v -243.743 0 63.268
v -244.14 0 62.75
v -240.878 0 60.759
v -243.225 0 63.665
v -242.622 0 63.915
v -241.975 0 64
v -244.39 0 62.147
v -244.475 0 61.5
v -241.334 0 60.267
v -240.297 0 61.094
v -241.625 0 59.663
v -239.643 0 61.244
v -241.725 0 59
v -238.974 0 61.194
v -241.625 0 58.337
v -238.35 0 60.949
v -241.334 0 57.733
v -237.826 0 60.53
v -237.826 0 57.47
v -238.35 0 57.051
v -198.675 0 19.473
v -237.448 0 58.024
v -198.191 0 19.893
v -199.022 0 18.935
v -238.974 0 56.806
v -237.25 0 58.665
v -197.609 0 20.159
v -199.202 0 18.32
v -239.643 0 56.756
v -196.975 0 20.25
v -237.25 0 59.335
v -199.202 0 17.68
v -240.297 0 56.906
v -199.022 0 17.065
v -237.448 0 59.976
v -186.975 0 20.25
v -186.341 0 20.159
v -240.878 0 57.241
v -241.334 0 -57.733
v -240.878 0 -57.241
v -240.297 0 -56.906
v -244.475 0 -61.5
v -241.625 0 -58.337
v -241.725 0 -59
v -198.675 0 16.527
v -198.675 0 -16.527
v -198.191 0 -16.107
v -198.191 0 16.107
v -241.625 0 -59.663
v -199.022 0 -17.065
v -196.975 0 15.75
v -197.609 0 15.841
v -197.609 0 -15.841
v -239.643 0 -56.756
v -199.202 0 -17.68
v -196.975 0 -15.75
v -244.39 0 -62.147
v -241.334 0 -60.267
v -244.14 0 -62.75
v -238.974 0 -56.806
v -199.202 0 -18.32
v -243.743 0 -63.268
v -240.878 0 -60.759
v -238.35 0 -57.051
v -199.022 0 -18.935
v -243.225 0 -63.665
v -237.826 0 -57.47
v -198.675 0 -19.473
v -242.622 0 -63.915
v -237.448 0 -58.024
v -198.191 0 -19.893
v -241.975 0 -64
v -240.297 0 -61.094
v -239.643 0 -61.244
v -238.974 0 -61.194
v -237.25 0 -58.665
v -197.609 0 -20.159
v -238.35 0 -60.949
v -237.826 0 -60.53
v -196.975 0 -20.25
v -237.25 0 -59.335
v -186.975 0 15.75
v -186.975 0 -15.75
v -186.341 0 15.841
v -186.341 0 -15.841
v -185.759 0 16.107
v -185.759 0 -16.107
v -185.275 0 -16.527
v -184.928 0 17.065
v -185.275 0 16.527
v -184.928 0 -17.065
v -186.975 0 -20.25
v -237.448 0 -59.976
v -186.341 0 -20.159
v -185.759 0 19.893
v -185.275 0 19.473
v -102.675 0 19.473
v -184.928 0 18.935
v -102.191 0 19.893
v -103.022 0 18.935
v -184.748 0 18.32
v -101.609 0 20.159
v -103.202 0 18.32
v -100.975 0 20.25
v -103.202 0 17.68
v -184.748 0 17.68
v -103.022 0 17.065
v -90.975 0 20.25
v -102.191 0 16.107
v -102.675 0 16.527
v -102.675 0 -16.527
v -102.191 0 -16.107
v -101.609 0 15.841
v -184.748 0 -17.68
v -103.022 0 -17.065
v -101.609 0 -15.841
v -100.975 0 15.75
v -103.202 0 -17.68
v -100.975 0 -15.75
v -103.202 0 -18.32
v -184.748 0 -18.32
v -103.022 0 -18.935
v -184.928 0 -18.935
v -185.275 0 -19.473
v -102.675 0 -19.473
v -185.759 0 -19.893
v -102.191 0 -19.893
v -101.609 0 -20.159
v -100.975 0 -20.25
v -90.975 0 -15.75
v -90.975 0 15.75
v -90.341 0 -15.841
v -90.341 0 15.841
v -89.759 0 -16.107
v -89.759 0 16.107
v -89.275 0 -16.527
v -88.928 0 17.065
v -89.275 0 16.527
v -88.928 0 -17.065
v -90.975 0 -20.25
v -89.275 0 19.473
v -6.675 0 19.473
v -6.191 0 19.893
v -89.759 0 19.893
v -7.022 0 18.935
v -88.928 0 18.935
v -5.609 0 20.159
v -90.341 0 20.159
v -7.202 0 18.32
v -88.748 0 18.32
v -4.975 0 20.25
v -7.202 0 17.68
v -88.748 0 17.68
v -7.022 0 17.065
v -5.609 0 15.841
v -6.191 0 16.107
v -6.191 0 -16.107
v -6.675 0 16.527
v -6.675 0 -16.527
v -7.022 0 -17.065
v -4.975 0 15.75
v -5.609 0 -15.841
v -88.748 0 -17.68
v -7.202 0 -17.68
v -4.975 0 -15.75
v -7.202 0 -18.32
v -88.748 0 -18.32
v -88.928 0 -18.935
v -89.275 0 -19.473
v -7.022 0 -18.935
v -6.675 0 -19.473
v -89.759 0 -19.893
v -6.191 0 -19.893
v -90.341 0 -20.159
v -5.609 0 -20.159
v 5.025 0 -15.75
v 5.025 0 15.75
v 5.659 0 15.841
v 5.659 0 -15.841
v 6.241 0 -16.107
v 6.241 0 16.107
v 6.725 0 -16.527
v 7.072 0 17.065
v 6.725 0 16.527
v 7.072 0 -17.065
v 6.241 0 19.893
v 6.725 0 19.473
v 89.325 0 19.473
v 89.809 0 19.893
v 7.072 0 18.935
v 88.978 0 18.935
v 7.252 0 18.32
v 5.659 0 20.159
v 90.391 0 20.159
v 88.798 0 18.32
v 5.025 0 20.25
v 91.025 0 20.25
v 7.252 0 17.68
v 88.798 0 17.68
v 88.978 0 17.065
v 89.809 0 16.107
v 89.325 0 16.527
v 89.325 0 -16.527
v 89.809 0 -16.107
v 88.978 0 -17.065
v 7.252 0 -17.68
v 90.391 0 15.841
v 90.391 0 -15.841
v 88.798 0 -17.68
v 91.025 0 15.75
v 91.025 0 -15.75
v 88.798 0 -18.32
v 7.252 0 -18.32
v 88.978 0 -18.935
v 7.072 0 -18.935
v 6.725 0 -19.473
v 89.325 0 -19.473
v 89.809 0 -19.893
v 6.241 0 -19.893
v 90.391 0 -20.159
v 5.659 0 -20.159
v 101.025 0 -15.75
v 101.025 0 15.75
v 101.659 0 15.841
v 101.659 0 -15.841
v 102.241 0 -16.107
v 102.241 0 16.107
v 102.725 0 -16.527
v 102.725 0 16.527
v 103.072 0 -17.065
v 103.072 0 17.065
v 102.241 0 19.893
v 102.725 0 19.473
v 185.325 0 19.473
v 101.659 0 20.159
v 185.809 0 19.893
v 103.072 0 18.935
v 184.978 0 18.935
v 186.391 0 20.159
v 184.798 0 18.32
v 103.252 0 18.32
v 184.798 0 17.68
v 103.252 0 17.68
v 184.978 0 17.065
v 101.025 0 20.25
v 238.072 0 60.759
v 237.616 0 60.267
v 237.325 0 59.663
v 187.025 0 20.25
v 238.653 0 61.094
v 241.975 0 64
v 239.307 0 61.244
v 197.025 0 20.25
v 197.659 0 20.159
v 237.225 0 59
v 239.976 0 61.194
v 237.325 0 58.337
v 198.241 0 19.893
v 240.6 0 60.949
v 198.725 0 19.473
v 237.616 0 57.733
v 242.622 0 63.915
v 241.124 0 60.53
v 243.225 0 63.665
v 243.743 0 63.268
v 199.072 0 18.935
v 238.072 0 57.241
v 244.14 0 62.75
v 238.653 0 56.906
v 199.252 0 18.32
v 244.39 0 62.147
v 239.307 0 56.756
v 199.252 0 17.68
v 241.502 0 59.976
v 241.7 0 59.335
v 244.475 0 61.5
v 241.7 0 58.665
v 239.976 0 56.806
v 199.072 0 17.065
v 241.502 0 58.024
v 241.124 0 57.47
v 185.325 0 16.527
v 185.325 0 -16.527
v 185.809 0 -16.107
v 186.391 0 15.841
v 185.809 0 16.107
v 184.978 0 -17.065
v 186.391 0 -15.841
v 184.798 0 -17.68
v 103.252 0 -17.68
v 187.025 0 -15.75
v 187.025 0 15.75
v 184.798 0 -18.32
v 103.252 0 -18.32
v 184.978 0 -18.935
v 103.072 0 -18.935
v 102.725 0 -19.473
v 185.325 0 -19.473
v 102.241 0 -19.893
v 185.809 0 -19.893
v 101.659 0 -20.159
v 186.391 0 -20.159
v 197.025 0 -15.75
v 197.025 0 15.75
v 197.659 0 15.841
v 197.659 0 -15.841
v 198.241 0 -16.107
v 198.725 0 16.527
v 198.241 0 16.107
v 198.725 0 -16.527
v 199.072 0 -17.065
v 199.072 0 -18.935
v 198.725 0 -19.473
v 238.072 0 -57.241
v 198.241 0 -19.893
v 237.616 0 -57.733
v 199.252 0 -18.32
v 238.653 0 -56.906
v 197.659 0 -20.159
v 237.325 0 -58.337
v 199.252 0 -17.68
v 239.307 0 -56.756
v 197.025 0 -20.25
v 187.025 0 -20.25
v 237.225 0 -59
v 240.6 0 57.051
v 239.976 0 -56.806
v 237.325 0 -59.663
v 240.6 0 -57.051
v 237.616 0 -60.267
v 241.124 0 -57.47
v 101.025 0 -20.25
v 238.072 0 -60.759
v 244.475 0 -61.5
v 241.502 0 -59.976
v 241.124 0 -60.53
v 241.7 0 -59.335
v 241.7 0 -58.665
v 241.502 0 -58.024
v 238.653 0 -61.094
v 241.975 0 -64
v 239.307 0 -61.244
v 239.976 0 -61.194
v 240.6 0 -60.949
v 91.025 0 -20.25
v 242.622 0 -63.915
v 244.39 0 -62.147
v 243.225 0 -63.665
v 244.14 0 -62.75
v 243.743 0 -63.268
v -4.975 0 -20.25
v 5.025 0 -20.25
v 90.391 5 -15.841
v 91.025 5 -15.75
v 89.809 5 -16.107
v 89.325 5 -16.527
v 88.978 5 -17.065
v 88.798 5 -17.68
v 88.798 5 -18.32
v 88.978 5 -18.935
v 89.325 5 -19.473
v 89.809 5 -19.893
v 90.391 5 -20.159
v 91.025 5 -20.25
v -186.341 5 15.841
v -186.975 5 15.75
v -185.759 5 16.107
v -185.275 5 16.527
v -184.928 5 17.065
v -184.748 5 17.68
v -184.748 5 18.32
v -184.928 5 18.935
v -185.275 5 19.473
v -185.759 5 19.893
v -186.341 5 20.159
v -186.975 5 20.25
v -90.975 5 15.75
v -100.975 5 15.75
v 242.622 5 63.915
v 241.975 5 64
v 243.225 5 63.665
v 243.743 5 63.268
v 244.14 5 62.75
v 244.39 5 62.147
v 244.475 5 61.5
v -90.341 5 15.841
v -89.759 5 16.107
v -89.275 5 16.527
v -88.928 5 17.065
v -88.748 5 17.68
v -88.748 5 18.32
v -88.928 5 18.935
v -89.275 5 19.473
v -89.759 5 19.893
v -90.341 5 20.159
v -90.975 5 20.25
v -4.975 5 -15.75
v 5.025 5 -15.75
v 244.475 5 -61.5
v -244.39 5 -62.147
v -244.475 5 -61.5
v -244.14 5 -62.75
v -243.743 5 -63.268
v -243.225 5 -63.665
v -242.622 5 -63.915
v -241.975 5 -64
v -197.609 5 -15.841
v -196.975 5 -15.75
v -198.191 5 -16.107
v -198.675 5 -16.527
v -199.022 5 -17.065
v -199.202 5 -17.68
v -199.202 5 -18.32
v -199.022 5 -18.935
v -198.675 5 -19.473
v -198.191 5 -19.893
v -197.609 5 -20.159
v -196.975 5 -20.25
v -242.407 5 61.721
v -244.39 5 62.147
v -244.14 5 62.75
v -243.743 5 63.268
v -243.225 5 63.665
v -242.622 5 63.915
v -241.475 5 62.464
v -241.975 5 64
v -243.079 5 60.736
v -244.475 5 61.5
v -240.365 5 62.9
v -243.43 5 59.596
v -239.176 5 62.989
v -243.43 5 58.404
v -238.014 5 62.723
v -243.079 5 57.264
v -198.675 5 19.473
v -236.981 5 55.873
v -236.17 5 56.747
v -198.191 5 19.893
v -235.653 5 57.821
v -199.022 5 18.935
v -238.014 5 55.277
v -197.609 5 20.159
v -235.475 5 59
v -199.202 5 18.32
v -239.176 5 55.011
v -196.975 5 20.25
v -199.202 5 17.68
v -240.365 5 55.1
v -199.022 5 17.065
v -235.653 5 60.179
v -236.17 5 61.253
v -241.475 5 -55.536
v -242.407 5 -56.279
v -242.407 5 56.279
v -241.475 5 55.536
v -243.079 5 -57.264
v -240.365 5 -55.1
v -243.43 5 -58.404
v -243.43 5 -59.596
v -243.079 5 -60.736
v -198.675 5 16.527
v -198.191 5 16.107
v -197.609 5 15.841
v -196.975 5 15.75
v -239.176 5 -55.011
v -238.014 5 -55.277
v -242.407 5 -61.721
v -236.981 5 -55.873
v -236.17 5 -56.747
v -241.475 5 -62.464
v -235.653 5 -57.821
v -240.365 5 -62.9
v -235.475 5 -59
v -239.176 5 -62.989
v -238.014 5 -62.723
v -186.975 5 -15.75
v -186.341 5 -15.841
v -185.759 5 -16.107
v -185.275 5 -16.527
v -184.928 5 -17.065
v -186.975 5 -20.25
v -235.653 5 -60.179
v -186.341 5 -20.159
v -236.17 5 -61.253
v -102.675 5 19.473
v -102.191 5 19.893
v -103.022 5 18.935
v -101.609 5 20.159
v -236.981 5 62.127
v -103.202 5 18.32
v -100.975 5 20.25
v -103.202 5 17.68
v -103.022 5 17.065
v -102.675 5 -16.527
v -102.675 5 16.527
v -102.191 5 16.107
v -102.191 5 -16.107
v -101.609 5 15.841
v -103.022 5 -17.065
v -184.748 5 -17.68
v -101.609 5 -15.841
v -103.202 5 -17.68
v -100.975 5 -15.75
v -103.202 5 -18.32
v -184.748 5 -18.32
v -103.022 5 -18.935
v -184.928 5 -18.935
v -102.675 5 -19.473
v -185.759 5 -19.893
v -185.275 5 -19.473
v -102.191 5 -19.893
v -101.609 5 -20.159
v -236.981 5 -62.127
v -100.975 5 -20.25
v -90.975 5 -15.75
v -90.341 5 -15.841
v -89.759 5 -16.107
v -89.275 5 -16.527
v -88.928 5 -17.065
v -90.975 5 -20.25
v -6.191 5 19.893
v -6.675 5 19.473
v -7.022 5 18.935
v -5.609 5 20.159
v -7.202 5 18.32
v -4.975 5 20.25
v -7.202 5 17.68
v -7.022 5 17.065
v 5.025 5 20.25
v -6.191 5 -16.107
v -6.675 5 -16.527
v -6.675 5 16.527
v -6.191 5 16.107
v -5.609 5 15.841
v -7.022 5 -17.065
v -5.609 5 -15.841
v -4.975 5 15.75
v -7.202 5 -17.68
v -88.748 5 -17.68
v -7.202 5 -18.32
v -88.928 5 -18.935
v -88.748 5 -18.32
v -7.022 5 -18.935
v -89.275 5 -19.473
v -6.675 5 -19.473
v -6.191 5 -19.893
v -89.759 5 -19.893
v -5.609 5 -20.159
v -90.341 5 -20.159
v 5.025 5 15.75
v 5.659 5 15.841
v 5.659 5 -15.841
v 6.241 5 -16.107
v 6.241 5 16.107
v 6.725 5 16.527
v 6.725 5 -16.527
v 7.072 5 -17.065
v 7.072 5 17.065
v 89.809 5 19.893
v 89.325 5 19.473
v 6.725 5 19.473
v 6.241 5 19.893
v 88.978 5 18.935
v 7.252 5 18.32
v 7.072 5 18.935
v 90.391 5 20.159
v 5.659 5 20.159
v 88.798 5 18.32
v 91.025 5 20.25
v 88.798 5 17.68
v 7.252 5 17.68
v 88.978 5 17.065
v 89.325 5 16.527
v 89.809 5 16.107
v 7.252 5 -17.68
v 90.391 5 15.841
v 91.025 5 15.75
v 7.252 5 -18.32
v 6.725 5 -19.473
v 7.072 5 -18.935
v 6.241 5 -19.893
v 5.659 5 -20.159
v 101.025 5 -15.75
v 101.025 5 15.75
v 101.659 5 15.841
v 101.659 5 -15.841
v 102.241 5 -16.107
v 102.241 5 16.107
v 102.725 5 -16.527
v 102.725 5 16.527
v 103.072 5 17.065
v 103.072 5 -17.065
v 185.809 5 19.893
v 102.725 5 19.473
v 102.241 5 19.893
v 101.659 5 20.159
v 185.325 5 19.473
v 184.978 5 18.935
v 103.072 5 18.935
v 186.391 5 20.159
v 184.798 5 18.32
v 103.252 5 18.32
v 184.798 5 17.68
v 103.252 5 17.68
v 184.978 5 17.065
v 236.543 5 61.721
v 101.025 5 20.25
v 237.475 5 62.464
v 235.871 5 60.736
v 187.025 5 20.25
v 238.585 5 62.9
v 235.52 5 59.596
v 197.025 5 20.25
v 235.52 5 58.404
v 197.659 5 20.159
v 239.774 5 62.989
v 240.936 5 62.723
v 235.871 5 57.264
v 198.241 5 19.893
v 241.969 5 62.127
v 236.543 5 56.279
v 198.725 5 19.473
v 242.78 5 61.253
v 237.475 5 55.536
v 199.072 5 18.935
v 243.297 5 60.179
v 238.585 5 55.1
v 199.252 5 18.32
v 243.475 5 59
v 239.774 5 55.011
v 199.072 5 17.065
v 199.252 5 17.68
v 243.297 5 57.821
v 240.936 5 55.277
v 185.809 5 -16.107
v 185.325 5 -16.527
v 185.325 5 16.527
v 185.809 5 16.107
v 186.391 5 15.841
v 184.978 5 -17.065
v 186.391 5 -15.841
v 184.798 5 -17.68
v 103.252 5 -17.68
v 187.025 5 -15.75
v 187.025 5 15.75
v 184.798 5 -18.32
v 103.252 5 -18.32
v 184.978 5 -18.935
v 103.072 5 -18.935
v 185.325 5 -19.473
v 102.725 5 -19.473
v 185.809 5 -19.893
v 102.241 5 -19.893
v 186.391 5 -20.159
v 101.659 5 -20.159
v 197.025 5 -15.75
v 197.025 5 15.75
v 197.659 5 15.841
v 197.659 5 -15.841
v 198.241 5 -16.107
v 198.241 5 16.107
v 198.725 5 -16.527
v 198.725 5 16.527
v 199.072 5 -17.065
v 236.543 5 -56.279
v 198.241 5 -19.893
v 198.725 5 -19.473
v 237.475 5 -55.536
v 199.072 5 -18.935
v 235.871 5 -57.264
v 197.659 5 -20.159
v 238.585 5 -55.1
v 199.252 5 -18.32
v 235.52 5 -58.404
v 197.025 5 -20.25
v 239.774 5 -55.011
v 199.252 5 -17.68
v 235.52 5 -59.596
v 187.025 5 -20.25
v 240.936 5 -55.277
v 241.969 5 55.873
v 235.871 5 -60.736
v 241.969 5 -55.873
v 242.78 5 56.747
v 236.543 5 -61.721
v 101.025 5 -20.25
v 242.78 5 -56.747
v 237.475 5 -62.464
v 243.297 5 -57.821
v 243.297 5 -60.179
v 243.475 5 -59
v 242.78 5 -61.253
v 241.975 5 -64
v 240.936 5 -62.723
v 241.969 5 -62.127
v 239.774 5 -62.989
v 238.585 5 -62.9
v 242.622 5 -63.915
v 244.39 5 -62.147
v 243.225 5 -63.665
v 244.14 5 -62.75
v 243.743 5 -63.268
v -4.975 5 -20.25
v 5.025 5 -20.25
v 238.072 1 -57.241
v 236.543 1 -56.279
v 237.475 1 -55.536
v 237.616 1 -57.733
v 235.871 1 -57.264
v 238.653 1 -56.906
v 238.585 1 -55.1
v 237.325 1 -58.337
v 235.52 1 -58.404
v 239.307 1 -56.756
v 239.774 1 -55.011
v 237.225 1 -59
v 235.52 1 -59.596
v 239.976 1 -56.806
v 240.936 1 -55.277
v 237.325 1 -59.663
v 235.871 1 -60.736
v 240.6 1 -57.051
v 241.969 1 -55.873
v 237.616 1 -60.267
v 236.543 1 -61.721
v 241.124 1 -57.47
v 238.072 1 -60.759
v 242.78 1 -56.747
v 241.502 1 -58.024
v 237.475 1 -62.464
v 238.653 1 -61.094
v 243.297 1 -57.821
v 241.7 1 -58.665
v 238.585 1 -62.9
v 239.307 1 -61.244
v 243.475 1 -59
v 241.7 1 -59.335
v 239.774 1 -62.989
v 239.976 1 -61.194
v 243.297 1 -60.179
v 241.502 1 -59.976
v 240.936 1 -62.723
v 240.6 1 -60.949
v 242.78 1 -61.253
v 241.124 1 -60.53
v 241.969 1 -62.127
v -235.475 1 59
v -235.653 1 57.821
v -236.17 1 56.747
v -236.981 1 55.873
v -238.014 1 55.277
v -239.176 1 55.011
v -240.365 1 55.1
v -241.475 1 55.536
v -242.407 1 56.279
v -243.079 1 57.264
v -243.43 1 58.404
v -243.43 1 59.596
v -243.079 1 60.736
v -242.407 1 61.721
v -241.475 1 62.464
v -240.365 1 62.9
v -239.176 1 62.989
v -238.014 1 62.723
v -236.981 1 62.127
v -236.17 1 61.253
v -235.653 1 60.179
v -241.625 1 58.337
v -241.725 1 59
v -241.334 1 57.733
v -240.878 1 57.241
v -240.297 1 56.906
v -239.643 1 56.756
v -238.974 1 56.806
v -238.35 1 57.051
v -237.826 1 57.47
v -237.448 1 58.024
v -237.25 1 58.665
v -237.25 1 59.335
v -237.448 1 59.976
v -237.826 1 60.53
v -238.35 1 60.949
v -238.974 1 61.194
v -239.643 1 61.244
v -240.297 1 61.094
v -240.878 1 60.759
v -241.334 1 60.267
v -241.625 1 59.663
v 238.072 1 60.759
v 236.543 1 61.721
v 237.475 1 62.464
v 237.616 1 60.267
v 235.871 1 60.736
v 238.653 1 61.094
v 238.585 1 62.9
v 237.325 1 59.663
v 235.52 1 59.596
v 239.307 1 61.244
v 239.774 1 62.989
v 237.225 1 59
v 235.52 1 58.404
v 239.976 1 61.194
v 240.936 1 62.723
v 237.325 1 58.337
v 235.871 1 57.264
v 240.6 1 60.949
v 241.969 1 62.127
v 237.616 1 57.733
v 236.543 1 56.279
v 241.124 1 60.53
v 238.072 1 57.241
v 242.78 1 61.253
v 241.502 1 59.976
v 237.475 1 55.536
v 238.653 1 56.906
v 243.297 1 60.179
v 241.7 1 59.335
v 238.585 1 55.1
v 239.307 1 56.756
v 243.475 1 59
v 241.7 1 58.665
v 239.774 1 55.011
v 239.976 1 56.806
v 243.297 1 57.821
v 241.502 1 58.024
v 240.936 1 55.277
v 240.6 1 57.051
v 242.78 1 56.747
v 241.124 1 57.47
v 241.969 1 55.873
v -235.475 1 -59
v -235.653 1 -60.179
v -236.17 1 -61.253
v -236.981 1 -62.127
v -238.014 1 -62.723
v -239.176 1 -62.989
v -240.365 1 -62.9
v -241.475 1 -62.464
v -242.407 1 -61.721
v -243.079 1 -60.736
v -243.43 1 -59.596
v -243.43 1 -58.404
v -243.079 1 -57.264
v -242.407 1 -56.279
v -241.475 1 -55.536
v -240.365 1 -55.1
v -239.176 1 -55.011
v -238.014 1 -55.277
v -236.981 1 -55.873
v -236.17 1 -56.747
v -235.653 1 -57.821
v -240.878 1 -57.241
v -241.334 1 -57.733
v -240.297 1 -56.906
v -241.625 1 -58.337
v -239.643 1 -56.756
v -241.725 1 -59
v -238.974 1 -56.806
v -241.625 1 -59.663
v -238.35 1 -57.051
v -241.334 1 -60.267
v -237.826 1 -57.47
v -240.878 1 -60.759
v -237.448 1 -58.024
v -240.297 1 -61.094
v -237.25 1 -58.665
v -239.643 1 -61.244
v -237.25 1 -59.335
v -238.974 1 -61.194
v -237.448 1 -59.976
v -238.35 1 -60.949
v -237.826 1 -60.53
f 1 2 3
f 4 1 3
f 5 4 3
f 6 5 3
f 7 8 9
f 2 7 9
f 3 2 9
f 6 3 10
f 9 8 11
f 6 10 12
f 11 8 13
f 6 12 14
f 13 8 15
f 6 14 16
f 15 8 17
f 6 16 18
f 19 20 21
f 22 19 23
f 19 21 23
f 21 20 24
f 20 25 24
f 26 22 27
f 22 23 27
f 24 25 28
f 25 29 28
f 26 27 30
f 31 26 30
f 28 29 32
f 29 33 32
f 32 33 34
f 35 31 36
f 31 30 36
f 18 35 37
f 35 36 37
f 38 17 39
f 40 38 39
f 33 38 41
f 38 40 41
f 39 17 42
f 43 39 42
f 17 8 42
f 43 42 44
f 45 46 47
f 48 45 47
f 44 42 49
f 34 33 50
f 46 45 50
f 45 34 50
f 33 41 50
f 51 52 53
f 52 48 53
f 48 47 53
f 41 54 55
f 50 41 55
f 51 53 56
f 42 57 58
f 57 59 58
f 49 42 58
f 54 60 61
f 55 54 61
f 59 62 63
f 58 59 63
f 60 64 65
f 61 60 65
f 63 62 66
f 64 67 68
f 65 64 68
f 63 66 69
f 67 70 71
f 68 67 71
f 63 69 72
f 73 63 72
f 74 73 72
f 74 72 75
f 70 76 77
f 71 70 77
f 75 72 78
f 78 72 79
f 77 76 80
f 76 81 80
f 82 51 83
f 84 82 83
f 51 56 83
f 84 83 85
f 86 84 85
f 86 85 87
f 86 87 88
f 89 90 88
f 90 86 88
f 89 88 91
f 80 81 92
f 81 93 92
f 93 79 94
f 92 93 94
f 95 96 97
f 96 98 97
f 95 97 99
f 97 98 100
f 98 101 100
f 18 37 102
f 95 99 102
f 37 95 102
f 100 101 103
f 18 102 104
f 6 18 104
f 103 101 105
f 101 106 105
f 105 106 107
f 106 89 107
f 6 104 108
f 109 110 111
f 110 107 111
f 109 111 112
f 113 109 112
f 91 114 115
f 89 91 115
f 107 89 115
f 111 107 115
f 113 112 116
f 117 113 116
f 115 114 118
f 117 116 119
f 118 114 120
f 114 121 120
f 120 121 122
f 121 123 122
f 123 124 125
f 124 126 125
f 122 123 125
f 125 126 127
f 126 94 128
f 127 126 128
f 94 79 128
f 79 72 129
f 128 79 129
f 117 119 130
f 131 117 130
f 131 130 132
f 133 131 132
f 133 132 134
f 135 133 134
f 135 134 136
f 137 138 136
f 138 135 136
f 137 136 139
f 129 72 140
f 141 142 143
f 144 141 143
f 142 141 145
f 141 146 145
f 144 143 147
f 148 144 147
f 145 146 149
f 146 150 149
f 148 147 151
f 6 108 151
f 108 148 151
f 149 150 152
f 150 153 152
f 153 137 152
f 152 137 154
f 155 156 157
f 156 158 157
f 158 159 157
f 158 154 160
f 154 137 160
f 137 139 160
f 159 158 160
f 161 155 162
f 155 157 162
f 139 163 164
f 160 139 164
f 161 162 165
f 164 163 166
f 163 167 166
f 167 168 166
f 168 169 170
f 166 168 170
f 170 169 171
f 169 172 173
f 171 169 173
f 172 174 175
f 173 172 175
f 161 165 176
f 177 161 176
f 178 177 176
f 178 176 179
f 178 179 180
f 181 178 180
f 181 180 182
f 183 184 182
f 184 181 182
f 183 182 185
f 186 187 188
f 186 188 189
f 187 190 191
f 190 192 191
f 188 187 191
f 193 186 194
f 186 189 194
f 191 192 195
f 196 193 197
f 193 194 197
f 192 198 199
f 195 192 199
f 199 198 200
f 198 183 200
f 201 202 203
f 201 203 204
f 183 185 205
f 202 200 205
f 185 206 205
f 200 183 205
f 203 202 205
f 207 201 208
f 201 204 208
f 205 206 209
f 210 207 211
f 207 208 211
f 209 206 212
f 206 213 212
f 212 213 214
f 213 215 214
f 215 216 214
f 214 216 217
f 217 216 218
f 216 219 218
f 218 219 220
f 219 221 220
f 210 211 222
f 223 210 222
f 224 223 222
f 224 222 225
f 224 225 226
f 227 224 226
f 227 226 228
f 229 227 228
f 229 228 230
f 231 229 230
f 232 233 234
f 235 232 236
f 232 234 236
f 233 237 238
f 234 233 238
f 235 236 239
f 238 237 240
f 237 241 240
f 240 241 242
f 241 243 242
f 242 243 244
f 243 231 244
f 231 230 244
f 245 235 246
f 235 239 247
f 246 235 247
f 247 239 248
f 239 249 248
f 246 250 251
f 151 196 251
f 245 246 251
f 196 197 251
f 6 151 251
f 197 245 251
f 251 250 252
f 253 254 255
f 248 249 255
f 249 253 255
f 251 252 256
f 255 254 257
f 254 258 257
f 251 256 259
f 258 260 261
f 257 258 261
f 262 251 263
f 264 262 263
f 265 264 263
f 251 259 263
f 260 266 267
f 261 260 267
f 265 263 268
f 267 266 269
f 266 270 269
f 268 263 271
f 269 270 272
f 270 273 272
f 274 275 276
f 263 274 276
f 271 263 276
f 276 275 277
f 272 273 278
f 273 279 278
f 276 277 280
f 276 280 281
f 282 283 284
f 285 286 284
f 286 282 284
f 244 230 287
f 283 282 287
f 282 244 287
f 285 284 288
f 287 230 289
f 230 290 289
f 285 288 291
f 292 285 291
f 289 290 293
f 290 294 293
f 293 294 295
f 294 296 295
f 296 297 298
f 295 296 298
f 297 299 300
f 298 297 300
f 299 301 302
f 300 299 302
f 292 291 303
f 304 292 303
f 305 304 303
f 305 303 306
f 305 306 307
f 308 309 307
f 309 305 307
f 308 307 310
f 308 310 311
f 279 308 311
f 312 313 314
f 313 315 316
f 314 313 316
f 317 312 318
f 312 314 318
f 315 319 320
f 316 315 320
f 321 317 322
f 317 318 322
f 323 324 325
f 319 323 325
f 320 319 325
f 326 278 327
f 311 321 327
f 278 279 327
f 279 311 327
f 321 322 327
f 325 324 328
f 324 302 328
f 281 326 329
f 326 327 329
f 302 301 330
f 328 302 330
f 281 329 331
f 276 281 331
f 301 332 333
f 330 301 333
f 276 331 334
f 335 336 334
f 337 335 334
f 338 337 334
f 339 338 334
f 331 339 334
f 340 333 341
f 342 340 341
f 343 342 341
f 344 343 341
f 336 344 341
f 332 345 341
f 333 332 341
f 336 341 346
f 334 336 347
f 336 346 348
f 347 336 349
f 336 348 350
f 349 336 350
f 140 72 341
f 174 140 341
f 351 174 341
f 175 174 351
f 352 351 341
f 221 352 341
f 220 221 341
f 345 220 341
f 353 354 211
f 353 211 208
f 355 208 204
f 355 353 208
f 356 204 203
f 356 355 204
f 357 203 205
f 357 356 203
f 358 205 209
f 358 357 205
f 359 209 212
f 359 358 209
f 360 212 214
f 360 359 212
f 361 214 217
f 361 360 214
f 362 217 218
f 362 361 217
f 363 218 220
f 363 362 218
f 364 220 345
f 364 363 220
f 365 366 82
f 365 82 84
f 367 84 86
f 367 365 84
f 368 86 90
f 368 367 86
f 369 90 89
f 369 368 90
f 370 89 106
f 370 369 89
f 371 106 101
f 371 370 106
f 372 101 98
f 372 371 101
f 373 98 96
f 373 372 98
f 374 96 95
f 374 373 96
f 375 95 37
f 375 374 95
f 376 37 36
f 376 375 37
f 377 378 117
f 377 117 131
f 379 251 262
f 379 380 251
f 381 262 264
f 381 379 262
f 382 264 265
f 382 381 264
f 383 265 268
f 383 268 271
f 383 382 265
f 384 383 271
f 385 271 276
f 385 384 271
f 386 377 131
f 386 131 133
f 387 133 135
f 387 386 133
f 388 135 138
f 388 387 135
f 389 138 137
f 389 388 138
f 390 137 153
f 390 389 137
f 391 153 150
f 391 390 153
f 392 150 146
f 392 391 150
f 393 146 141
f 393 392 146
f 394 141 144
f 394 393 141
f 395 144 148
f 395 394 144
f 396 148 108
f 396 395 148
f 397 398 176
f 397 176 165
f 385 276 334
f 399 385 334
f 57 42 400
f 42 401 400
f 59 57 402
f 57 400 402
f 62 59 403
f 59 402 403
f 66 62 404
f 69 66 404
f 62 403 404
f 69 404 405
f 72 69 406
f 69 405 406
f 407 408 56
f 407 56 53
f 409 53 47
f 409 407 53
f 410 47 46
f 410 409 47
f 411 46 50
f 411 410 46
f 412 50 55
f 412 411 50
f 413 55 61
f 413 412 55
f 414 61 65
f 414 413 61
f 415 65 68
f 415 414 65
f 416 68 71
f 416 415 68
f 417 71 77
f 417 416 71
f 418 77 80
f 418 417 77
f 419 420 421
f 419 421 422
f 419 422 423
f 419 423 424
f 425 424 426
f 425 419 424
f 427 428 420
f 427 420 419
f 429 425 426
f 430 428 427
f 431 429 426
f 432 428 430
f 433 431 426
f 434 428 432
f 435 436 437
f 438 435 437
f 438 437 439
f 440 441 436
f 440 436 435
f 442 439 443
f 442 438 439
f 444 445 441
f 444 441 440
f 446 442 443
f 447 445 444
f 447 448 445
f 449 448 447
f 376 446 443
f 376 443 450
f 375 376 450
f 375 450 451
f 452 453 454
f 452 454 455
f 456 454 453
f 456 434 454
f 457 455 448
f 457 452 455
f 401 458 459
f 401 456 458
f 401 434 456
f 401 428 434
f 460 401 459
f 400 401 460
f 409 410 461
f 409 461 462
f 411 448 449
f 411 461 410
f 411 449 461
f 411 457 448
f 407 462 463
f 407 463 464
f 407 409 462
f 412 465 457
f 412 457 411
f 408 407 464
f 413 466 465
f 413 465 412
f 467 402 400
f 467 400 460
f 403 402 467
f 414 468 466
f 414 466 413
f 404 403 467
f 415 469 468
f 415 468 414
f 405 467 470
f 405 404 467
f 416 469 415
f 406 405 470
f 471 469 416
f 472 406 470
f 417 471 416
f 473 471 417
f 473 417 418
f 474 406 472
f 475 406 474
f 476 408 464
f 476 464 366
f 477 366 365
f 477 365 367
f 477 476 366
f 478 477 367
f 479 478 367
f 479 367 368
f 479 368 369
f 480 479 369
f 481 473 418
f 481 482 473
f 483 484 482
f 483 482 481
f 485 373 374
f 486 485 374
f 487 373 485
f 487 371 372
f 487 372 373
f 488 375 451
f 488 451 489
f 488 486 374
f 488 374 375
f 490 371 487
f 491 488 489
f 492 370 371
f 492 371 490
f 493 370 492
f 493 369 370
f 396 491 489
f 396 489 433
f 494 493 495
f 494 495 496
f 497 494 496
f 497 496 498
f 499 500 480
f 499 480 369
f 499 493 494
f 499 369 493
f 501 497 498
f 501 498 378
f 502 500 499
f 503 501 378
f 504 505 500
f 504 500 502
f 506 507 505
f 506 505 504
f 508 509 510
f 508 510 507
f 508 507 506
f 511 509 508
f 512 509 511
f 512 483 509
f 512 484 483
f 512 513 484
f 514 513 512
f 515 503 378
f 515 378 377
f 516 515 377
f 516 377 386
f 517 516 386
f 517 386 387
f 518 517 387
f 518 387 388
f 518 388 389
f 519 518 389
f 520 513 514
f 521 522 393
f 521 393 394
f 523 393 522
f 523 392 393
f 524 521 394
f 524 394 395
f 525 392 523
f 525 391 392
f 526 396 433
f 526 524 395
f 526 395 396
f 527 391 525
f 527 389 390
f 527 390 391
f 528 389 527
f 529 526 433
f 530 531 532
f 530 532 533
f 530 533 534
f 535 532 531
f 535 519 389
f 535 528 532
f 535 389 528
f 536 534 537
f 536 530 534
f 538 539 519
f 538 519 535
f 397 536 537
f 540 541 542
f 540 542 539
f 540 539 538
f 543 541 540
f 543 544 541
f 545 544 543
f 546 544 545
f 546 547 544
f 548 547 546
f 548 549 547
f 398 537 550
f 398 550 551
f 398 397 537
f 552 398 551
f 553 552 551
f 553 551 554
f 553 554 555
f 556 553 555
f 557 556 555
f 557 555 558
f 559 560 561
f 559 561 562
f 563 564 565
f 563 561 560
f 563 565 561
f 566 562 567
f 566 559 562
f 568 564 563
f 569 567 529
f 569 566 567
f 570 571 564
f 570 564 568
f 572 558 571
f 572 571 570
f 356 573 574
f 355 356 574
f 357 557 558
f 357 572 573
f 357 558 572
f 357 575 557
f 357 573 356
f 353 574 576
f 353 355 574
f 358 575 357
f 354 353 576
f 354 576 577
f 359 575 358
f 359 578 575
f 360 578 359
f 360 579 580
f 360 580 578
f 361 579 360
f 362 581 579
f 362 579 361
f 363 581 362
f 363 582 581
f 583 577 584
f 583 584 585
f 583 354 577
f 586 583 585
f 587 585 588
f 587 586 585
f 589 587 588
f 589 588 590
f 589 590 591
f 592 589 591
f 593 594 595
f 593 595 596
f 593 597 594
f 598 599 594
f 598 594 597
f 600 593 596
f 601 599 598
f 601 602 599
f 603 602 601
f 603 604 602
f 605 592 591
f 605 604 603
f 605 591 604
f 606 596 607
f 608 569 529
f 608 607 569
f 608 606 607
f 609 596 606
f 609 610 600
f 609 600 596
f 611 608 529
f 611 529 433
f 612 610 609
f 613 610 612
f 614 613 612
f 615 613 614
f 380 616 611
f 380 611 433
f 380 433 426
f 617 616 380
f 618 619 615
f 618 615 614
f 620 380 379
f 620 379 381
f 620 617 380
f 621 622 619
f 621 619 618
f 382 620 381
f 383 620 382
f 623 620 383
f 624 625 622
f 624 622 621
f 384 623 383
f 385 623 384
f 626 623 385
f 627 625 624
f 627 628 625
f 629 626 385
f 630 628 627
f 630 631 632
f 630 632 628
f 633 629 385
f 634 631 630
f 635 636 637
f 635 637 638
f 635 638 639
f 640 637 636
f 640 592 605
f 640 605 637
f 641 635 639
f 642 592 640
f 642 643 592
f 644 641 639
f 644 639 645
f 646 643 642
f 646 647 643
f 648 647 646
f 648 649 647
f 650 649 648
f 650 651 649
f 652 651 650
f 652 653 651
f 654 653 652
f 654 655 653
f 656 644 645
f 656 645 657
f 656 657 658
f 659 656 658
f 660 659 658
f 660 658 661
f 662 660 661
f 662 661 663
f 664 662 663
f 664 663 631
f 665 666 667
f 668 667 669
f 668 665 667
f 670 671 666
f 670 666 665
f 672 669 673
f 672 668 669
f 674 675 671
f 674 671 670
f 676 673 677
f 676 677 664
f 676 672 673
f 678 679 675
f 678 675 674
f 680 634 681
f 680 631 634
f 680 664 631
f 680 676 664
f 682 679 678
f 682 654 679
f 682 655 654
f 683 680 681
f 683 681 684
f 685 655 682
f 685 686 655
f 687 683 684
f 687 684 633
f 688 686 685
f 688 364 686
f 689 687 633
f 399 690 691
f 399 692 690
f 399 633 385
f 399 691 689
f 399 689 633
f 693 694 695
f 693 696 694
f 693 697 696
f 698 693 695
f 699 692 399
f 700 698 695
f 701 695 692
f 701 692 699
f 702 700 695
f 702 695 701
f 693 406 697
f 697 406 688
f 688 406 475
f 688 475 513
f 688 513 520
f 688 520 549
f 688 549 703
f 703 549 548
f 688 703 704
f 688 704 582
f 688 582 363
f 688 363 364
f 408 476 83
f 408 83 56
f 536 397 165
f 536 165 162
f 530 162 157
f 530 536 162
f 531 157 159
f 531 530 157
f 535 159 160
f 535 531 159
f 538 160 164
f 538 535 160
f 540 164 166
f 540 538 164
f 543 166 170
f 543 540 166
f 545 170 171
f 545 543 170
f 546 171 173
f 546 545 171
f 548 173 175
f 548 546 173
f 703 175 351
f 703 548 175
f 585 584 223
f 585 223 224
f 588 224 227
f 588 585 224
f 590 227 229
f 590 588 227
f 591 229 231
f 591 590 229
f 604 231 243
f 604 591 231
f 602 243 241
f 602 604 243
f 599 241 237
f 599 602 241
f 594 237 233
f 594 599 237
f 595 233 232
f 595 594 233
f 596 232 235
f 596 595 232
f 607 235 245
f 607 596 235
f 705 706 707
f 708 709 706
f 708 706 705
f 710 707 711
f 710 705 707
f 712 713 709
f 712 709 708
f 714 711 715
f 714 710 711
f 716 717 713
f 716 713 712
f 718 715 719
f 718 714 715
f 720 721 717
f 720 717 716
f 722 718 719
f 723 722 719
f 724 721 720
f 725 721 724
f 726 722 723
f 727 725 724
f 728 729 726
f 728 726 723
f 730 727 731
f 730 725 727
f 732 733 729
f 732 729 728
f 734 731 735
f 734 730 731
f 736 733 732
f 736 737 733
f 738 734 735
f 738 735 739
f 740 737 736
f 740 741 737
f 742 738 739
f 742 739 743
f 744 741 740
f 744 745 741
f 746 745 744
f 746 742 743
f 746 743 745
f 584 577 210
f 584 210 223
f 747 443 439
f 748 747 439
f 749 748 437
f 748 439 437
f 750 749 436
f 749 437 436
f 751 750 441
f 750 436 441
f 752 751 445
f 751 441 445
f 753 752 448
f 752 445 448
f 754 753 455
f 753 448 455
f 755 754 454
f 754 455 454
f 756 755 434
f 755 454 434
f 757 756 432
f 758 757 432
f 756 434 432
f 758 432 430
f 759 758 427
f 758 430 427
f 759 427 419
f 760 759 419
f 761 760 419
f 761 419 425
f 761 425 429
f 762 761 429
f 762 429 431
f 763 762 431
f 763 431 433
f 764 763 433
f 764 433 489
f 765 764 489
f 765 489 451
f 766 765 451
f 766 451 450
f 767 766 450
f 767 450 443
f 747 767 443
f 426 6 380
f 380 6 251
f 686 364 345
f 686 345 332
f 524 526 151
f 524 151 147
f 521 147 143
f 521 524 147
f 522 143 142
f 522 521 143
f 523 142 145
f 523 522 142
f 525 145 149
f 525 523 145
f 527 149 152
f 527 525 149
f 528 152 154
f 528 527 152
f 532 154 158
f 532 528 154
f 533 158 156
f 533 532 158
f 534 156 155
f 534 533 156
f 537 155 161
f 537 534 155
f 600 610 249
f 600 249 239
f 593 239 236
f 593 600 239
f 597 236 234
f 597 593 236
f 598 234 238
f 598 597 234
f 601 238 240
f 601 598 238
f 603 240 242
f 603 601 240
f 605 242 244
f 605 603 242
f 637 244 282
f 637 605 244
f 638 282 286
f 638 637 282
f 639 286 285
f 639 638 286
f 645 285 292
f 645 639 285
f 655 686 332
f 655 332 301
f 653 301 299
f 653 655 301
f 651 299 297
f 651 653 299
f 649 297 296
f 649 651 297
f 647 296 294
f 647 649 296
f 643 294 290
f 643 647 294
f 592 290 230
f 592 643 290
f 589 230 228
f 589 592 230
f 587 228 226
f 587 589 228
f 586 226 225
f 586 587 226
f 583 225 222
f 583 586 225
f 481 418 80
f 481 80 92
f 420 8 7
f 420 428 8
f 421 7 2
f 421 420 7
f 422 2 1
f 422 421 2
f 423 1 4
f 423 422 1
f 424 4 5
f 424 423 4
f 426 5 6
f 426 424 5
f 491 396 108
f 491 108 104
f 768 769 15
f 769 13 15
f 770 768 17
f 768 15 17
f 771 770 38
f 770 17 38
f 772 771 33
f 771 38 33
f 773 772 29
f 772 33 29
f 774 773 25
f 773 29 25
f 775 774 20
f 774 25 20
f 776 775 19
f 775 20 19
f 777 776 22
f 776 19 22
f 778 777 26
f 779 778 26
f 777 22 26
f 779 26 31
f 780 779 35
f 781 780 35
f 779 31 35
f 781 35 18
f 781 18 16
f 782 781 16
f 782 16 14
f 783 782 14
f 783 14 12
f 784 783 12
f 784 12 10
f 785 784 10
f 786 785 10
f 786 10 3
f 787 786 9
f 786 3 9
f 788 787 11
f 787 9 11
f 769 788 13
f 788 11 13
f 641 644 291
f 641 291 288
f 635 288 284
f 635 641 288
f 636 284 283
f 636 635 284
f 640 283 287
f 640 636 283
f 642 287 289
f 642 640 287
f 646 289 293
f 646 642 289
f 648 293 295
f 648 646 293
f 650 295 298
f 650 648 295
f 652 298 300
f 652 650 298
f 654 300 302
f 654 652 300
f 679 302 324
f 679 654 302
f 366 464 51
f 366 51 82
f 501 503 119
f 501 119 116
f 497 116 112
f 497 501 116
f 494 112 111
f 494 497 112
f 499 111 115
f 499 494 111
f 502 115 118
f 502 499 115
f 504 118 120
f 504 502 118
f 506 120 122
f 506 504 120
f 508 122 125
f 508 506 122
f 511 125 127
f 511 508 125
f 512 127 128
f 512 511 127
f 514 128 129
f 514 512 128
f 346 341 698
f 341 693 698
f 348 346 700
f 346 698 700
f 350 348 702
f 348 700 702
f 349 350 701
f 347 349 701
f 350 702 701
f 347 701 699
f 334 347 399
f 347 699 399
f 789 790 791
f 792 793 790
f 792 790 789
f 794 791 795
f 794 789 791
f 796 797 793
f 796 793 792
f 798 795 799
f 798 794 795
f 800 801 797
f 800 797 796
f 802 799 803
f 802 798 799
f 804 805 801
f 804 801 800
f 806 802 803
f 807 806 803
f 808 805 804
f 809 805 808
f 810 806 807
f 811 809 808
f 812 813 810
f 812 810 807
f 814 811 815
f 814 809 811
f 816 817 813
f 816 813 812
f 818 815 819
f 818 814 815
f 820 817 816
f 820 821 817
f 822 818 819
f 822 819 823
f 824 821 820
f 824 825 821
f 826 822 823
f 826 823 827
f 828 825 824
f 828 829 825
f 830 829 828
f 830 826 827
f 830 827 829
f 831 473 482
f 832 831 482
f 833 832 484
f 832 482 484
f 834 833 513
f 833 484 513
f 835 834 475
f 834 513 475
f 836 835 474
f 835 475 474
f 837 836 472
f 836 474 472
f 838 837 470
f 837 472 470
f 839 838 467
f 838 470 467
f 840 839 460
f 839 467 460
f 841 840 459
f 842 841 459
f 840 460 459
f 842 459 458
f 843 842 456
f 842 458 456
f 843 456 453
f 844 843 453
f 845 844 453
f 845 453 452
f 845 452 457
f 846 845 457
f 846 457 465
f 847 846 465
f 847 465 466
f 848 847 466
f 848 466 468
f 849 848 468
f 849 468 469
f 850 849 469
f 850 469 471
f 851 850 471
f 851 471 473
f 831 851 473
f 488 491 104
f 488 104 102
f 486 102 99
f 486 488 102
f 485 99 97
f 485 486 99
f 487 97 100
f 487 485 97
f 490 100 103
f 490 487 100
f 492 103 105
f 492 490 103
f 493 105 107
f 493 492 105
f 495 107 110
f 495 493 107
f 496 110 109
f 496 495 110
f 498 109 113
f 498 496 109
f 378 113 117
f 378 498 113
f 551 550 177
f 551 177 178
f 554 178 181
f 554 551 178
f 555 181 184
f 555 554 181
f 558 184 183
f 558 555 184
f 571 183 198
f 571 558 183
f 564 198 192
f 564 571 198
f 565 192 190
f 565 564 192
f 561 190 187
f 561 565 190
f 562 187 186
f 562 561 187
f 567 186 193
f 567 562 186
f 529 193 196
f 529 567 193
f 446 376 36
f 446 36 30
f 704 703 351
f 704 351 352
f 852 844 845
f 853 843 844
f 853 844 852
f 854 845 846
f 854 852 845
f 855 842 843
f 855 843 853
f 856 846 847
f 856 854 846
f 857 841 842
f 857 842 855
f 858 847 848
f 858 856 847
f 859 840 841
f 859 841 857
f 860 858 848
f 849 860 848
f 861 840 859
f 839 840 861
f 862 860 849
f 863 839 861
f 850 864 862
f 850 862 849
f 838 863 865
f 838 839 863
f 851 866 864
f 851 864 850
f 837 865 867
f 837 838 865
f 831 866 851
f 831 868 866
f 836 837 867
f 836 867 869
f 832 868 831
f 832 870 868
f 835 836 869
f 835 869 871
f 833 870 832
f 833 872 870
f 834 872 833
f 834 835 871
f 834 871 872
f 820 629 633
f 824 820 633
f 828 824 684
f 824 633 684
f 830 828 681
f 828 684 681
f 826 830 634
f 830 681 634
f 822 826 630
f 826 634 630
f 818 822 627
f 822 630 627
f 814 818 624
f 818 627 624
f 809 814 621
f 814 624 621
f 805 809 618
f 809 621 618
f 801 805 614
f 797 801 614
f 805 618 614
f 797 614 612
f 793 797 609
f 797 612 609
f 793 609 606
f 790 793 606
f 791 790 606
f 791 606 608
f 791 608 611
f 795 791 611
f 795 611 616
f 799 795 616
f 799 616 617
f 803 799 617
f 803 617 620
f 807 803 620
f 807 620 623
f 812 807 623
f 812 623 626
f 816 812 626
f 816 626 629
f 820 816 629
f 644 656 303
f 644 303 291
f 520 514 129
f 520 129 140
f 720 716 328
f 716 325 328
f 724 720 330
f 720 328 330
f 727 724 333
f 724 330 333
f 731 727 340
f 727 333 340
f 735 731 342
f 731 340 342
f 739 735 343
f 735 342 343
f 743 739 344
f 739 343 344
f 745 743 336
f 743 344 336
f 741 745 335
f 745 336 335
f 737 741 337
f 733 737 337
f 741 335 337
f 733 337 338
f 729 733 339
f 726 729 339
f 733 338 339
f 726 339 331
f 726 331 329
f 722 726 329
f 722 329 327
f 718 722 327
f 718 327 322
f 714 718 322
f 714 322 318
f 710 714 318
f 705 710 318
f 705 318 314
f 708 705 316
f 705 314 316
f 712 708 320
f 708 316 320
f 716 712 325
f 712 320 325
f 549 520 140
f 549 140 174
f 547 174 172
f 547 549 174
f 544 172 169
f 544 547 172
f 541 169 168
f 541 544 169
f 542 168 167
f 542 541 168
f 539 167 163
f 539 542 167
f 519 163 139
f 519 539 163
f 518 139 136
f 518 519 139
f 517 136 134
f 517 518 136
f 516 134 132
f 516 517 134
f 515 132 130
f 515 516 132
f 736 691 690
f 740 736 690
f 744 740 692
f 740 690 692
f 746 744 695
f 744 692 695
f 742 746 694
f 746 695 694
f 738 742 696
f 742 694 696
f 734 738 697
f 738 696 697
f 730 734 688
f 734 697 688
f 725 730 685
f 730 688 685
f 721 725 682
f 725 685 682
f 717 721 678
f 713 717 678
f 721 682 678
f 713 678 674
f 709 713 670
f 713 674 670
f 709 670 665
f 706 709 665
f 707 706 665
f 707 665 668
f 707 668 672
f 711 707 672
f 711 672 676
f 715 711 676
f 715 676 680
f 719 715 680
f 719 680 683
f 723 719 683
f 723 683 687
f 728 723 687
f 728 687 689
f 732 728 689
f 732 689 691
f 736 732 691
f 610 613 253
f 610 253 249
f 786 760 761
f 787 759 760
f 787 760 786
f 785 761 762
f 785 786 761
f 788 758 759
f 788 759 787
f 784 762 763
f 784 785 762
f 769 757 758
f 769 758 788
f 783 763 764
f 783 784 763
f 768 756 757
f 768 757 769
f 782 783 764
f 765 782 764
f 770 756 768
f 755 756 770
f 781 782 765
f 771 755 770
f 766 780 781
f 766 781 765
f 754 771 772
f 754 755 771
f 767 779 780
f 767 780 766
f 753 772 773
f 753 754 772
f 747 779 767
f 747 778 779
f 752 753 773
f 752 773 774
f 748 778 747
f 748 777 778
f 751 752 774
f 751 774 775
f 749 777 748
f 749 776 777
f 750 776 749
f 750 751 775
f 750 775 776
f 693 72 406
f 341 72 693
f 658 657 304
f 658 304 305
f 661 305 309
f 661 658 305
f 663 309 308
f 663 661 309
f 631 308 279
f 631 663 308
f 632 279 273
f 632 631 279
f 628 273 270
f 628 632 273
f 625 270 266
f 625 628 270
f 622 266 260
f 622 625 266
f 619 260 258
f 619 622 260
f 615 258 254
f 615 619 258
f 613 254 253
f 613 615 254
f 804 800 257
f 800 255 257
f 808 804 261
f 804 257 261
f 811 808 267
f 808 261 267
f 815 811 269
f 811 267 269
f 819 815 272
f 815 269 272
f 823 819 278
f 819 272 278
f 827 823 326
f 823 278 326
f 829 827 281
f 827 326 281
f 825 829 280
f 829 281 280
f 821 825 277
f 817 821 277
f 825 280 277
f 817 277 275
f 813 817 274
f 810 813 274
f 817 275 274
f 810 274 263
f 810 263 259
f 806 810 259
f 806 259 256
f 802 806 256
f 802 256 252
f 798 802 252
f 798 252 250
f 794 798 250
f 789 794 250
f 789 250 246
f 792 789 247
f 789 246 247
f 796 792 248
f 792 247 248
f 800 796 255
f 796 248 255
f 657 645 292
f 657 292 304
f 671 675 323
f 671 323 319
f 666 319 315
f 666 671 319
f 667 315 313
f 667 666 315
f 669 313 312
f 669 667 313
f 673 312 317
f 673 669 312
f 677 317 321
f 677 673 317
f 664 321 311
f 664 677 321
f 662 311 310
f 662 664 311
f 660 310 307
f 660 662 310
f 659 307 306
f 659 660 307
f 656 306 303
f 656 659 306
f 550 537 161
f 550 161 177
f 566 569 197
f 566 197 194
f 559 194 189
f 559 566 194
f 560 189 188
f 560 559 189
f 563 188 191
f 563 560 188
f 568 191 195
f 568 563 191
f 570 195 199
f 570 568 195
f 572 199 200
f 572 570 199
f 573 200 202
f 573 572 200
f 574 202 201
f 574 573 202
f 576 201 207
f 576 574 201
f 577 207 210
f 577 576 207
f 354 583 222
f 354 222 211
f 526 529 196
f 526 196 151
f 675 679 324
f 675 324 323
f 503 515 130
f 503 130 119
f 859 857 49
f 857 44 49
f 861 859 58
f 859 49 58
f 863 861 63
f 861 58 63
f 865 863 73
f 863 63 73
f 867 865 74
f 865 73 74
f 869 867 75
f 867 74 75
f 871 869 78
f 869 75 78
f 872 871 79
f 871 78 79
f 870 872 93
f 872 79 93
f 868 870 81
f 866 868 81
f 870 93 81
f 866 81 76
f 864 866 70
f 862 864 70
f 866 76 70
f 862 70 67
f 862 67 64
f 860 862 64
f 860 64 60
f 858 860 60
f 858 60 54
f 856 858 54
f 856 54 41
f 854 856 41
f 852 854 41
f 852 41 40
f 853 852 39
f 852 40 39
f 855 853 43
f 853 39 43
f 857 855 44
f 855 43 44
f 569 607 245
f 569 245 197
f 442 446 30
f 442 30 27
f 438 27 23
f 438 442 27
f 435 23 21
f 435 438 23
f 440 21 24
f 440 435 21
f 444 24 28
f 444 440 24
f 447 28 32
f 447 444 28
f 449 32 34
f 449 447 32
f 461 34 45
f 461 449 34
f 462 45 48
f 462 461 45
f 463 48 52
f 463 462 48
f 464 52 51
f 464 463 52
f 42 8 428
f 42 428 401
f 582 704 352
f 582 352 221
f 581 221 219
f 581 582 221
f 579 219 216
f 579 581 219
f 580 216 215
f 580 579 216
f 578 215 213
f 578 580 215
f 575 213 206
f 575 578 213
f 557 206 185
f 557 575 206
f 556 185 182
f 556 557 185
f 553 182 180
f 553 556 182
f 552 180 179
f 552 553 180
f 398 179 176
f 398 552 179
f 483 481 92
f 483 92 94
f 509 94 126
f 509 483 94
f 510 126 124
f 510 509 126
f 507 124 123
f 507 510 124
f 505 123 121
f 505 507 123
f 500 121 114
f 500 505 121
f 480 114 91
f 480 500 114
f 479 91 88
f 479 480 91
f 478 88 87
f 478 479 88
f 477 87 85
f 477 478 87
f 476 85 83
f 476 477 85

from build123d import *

# Parameters (mm, degrees)
SKETCH1_W                      = 488.95
SKETCH1_H                      = 128
BOSS_EXTRUDE1_DEPTH            = 5
CBORE_FOR_M4_SHCS1_D           = 4.5
CBORE_FOR_M4_SHCS1_DEPTH       = 17.38
CBORE_FOR_M4_SHCS1_CBORE_D     = 8
CBORE_FOR_M4_SHCS1_CBORE_DEPTH = 4
CBORE_FOR_M4_SHCS1_TIP         = 1.351936393
FILLET1_R                      = 2.5
CUT_EXTRUDE1_DEPTH             = 253.762785285
LPATTERN1_COUNT                = 5
LPATTERN1_PITCH                = 96


with BuildPart() as part:
    # Sketch1 → Boss-Extrude1 (new body)
    with BuildSketch(Plane(origin=(0, 0, 0), x_dir=(1, 0, 0), z_dir=(0, 1, 0))):
        Rectangle(SKETCH1_W, SKETCH1_H)
    extrude(amount=BOSS_EXTRUDE1_DEPTH)

    # CBORE for M4 SHCS1
    with Locations(Plane(origin=(0, 5, 0), x_dir=(1, 0, 0), z_dir=(0, 1, 0))):
        with Locations((-239.475, 59), (-239.475, -59), (239.475, -59), (239.475, 59)):
            CounterBoreHole(CBORE_FOR_M4_SHCS1_D / 2, CBORE_FOR_M4_SHCS1_CBORE_D / 2, CBORE_FOR_M4_SHCS1_CBORE_DEPTH, depth=CBORE_FOR_M4_SHCS1_DEPTH)
            with Locations((0, 0, -(CBORE_FOR_M4_SHCS1_DEPTH + CBORE_FOR_M4_SHCS1_TIP / 2))):  # 118° drill point
                Cone(0, CBORE_FOR_M4_SHCS1_D / 2, CBORE_FOR_M4_SHCS1_TIP, mode=Mode.SUBTRACT)

    # Fillet1
    fillet1_edges = [part.edges().sort_by_distance(p)[0] for p in [
        (244.475, 2.5, 64),
        (-244.475, 2.5, 64),
        (-244.475, 2.5, -64),
        (244.475, 2.5, -64),
    ]]
    fillet(fillet1_edges, radius=FILLET1_R)

    # Sketch4 → Cut-Extrude1 (cut, through all)
    with BuildSketch(Plane(origin=(0, 5, 0), x_dir=(1, 0, 0), z_dir=(0, 1, 0))):
        with BuildLine():
            Line((-196.975, 20.25), (-186.975, 20.25))
            ThreePointArc((-186.975, 20.25), (-184.725, 18), (-186.975, 15.75))
            Line((-186.975, 15.75), (-196.975, 15.75))
            ThreePointArc((-196.975, 15.75), (-199.225, 18), (-196.975, 20.25))
        make_face()
        with BuildLine():
            Line((-196.975, -15.75), (-186.975, -15.75))
            ThreePointArc((-186.975, -15.75), (-184.725, -18), (-186.975, -20.25))
            Line((-186.975, -20.25), (-196.975, -20.25))
            ThreePointArc((-196.975, -20.25), (-199.225, -18), (-196.975, -15.75))
        make_face()
    cut_extrude1 = extrude(amount=-CUT_EXTRUDE1_DEPTH, mode=Mode.SUBTRACT)

    # LPattern1: Cut-Extrude1 ×5
    with Locations(*[(i * LPATTERN1_PITCH, 0, 0) for i in range(1, LPATTERN1_COUNT)]):
        add(cut_extrude1, mode=Mode.SUBTRACT)


solid = part.part
